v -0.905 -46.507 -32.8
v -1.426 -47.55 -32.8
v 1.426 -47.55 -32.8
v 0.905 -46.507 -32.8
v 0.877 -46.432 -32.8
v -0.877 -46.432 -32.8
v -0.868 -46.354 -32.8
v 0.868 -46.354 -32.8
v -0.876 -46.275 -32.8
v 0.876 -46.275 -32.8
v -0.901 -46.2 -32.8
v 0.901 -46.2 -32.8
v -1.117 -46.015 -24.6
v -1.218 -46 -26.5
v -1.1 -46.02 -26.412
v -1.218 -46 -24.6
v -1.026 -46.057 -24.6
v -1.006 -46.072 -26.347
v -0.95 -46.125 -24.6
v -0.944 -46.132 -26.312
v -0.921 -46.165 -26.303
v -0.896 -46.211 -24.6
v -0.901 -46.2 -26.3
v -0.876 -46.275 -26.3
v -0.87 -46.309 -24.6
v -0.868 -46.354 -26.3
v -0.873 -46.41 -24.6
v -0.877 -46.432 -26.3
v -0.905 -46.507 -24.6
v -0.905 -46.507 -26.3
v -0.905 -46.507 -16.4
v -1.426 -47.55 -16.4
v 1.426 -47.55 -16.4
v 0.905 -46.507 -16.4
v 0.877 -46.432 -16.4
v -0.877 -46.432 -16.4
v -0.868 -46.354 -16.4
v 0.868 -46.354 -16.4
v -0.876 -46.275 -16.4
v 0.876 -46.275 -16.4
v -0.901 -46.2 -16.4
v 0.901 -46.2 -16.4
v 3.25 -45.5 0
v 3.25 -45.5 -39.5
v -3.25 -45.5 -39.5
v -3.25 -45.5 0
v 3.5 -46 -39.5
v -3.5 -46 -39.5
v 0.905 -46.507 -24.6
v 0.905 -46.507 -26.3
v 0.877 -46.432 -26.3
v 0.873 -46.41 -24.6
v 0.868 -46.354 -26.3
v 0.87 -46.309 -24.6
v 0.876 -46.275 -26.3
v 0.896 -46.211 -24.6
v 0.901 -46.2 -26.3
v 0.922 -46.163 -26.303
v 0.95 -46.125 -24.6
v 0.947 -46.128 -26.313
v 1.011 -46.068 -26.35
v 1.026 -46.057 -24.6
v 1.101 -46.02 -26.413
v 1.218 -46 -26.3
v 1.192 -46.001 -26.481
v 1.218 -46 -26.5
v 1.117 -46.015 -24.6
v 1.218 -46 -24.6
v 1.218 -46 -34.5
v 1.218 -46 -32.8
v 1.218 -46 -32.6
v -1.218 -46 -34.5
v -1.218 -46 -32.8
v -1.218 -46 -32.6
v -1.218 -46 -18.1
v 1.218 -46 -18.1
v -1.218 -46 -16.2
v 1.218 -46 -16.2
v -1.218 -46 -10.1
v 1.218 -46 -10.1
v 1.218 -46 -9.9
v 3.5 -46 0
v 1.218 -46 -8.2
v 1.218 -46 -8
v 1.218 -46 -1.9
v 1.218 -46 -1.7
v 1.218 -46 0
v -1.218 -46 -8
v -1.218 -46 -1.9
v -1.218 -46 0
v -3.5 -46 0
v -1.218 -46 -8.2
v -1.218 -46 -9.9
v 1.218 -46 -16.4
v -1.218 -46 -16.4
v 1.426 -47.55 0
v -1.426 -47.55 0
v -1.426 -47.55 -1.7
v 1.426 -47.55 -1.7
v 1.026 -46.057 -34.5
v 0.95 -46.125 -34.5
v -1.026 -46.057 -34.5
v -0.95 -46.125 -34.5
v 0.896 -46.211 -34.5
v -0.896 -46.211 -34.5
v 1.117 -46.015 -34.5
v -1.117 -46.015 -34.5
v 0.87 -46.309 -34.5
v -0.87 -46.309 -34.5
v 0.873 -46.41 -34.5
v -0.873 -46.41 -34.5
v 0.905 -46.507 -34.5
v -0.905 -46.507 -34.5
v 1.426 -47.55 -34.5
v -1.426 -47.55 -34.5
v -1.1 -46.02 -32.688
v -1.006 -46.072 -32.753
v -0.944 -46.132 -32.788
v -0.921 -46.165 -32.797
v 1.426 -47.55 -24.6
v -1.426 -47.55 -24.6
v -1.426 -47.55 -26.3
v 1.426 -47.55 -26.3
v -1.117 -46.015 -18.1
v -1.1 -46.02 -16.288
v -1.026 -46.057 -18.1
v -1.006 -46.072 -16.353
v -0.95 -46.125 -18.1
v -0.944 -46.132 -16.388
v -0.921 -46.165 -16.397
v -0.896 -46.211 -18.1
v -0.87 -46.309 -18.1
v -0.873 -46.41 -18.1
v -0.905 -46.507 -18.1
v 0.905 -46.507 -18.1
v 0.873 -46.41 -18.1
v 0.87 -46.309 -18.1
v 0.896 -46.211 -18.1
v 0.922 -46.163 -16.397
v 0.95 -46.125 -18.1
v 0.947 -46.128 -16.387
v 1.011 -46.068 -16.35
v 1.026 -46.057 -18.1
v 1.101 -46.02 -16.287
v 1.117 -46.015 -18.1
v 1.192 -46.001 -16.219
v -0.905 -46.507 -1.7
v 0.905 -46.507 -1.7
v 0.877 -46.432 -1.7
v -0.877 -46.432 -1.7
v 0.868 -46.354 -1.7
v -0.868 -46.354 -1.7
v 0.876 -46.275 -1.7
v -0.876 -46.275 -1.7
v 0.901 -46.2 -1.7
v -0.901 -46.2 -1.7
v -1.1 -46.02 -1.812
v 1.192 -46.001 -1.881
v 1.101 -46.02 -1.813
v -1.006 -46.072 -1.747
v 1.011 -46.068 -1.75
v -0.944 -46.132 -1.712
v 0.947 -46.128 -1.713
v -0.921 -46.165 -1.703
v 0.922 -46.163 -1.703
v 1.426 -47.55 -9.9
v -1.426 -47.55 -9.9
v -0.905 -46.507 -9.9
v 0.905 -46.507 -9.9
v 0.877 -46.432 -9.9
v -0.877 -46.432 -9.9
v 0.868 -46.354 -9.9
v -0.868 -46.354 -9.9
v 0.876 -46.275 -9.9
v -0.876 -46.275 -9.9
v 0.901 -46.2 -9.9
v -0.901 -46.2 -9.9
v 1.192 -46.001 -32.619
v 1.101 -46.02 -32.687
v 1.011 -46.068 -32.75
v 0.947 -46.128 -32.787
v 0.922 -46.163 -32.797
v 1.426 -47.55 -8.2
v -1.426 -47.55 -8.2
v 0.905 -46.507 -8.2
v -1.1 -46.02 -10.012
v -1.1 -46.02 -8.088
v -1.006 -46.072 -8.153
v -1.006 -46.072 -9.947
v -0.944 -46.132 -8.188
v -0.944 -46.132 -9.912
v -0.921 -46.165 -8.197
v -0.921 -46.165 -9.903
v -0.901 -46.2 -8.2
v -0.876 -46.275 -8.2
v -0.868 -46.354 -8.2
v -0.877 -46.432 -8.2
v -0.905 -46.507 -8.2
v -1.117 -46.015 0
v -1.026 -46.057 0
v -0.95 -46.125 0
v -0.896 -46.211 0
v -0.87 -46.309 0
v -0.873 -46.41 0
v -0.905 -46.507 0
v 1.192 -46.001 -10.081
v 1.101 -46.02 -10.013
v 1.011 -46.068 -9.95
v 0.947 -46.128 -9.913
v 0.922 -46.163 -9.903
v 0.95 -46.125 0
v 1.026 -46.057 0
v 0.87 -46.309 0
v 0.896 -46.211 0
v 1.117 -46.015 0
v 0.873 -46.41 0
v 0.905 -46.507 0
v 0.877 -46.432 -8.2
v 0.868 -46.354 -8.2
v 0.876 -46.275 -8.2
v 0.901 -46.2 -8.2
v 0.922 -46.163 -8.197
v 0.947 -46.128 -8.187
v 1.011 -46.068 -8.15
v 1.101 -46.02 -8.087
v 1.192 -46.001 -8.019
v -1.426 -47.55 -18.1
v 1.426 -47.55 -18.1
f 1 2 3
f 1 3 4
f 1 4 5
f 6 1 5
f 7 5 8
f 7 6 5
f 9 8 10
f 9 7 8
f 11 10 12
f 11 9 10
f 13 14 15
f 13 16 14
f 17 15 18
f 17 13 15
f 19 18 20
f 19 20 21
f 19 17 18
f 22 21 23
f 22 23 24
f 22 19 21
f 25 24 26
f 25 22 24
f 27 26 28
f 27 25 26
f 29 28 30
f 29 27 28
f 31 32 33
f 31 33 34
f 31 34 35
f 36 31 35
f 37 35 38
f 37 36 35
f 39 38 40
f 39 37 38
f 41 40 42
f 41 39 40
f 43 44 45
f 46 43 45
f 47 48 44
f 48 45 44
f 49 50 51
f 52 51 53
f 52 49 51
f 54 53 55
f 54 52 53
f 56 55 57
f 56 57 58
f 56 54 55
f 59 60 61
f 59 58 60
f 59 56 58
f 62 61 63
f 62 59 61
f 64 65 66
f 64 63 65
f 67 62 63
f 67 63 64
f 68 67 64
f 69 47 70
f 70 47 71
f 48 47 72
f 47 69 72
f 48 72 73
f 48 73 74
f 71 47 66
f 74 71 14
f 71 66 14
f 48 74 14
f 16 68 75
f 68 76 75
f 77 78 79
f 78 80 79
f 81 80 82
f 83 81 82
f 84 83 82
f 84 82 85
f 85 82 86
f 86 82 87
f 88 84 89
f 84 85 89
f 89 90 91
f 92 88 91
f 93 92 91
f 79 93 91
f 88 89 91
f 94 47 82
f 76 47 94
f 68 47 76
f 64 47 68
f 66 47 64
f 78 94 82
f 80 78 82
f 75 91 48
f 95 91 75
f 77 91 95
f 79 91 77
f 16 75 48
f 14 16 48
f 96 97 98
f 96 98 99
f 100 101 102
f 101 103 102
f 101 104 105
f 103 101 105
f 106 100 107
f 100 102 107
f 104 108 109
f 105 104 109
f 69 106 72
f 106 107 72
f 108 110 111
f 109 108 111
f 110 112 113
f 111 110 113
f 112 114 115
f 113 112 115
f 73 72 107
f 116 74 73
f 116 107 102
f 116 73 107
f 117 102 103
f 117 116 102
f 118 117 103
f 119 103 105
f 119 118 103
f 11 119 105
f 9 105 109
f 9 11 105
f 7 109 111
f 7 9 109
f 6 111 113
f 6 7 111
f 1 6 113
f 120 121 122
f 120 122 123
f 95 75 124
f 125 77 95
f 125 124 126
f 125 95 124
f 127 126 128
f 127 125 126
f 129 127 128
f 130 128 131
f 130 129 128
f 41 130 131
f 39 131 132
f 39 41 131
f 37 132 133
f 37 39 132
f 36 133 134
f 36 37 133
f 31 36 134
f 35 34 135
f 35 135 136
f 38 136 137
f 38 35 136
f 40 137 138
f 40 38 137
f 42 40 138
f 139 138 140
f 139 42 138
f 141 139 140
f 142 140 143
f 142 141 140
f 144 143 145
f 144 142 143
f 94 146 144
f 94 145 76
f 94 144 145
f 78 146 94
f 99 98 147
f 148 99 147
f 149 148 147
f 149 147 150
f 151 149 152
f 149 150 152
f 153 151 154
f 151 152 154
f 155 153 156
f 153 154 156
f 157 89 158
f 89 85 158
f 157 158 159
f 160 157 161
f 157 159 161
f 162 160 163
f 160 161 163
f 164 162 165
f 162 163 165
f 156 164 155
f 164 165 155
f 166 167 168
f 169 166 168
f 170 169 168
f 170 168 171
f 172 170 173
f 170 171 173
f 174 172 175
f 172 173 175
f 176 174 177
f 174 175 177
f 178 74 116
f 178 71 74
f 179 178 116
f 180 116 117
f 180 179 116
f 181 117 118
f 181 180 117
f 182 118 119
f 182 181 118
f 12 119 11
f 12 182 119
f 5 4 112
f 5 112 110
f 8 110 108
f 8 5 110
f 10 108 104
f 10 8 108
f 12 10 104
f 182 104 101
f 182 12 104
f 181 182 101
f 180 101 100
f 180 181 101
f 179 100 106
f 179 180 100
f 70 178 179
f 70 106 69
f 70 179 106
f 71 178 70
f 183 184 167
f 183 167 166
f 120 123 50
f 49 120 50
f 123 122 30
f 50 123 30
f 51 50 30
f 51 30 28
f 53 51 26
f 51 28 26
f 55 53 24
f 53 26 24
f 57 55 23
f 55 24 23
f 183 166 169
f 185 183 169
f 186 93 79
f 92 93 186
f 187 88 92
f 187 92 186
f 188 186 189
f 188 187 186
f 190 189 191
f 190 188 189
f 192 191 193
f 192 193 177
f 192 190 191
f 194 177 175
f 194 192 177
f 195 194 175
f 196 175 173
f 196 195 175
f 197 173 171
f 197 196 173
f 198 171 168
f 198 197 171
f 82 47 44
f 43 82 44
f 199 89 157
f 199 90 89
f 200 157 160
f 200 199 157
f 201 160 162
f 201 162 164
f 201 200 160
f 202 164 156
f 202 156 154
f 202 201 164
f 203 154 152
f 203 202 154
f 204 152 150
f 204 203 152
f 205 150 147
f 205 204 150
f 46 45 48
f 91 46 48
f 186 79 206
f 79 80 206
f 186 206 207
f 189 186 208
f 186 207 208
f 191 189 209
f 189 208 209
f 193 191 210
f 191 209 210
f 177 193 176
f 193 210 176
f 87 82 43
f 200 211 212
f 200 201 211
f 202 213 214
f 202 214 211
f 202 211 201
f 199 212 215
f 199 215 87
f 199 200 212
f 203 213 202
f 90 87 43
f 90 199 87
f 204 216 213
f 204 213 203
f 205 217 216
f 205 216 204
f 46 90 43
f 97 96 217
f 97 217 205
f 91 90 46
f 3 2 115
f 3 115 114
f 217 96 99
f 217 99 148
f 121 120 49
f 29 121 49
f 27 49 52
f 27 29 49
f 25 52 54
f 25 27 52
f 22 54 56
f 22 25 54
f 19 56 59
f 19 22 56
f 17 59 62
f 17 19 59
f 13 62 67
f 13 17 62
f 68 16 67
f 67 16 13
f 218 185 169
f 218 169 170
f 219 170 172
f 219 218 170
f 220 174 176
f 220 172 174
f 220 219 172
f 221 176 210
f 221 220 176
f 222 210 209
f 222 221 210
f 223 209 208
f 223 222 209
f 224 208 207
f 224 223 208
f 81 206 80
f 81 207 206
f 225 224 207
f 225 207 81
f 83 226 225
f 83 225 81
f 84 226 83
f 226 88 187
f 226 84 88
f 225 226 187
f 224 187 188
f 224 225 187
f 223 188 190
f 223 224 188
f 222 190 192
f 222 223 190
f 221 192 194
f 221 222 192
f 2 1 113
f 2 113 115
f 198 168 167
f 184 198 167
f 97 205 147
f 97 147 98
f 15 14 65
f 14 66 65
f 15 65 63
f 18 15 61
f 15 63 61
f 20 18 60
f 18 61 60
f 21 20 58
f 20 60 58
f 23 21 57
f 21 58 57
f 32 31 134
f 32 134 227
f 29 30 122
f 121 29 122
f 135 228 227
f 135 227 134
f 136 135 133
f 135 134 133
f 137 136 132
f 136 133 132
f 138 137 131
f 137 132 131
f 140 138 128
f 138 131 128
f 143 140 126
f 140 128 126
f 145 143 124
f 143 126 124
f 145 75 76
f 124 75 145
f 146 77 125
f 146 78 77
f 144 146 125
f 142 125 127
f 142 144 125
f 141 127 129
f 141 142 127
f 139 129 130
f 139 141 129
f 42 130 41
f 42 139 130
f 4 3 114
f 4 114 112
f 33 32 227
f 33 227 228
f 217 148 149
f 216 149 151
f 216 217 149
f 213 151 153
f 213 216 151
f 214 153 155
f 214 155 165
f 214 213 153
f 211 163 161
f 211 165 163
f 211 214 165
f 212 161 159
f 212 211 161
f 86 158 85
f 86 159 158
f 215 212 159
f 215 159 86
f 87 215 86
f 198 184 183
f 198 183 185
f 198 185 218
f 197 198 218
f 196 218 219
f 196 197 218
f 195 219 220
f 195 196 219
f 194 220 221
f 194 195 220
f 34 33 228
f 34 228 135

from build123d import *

# Parameters (mm, degrees)
BOSS_EXTRUDE1_DEPTH     = 34.5
CUT_EXTRUDE1_DEPTH      = 59.851529292
CUT_EXTRUDE1_DEPTH_BACK = 59.851529292
SKETCH2_W               = 6.5
SKETCH2_H               = 1.55
BOSS_EXTRUDE2_DEPTH     = 5
FILLET1_R               = 0.2


with BuildPart() as part:
    # Sketch1 → Boss-Extrude1 (new body)
    with BuildSketch(Plane(origin=(0, 0, 0), x_dir=(1, 0, 0), z_dir=(0, 0, -1))):
        with BuildLine():
            Line((-3.5, 46), (-1.217705098, 46))
            ThreePointArc((-1.217705098, 46), (-0.919977315, 46.165994111), (-0.904655581, 46.506524758))
            Line((-0.904655581, 46.506524758), (-1.426393202, 47.55))
            Line((-1.426393202, 47.55), (1.426393202, 47.55))
            Line((1.426393202, 47.55), (0.904655581, 46.506524758))
            ThreePointArc((0.904655581, 46.506524758), (0.919977315, 46.165994111), (1.217705098, 46))
            Line((1.217705098, 46), (3.5, 46))
            Line((3.5, 46), (3.25, 45.5))
            Line((3.25, 45.5), (-3.25, 45.5))
            Line((-3.25, 45.5), (-3.5, 46))
        make_face()
    extrude(amount=BOSS_EXTRUDE1_DEPTH)

    # Sketch2 → Cut-Extrude1 (cut, two sides: drawn at the far end of the back side and taken through both)
    with BuildSketch(Plane(origin=(0, 0, 0), x_dir=(0, 0, -1), z_dir=(1, 0, 0)).offset(-CUT_EXTRUDE1_DEPTH_BACK)):
        with Locations((4.95, -46.775)):
            Rectangle(SKETCH2_W, SKETCH2_H)
        with Locations((29.55, -46.775)):
            Rectangle(SKETCH2_W, SKETCH2_H)
        with Locations((21.35, -46.775)):
            Rectangle(SKETCH2_W, SKETCH2_H)
        with Locations((13.15, -46.775)):
            Rectangle(SKETCH2_W, SKETCH2_H)
    extrude(amount=CUT_EXTRUDE1_DEPTH + CUT_EXTRUDE1_DEPTH_BACK, mode=Mode.SUBTRACT)

    # Sketch3 → Boss-Extrude2 (add)
    with BuildSketch(Plane(origin=(0, 0, -34.5), x_dir=(-1, 0, 0), z_dir=(0, 0, -1))):
        Polygon((1.217705098, -46), (-1.217705098, -46), (-3.5, -46), (-3.25, -45.5), (3.25, -45.5), (3.5, -46), align=None)
    extrude(amount=BOSS_EXTRUDE2_DEPTH)

    # Fillet1
    fillet1_edges = [part.edges().sort_by_distance(p)[0] for p in [
        (0, -46, -26.3),
        (0, -46, -32.8),
        (0, -46, -1.7),
        (0, -46, -8.2),
        (0, -46, -9.9),
        (0, -46, -16.4),
    ]]
    fillet(fillet1_edges, radius=FILLET1_R)


solid = part.part
